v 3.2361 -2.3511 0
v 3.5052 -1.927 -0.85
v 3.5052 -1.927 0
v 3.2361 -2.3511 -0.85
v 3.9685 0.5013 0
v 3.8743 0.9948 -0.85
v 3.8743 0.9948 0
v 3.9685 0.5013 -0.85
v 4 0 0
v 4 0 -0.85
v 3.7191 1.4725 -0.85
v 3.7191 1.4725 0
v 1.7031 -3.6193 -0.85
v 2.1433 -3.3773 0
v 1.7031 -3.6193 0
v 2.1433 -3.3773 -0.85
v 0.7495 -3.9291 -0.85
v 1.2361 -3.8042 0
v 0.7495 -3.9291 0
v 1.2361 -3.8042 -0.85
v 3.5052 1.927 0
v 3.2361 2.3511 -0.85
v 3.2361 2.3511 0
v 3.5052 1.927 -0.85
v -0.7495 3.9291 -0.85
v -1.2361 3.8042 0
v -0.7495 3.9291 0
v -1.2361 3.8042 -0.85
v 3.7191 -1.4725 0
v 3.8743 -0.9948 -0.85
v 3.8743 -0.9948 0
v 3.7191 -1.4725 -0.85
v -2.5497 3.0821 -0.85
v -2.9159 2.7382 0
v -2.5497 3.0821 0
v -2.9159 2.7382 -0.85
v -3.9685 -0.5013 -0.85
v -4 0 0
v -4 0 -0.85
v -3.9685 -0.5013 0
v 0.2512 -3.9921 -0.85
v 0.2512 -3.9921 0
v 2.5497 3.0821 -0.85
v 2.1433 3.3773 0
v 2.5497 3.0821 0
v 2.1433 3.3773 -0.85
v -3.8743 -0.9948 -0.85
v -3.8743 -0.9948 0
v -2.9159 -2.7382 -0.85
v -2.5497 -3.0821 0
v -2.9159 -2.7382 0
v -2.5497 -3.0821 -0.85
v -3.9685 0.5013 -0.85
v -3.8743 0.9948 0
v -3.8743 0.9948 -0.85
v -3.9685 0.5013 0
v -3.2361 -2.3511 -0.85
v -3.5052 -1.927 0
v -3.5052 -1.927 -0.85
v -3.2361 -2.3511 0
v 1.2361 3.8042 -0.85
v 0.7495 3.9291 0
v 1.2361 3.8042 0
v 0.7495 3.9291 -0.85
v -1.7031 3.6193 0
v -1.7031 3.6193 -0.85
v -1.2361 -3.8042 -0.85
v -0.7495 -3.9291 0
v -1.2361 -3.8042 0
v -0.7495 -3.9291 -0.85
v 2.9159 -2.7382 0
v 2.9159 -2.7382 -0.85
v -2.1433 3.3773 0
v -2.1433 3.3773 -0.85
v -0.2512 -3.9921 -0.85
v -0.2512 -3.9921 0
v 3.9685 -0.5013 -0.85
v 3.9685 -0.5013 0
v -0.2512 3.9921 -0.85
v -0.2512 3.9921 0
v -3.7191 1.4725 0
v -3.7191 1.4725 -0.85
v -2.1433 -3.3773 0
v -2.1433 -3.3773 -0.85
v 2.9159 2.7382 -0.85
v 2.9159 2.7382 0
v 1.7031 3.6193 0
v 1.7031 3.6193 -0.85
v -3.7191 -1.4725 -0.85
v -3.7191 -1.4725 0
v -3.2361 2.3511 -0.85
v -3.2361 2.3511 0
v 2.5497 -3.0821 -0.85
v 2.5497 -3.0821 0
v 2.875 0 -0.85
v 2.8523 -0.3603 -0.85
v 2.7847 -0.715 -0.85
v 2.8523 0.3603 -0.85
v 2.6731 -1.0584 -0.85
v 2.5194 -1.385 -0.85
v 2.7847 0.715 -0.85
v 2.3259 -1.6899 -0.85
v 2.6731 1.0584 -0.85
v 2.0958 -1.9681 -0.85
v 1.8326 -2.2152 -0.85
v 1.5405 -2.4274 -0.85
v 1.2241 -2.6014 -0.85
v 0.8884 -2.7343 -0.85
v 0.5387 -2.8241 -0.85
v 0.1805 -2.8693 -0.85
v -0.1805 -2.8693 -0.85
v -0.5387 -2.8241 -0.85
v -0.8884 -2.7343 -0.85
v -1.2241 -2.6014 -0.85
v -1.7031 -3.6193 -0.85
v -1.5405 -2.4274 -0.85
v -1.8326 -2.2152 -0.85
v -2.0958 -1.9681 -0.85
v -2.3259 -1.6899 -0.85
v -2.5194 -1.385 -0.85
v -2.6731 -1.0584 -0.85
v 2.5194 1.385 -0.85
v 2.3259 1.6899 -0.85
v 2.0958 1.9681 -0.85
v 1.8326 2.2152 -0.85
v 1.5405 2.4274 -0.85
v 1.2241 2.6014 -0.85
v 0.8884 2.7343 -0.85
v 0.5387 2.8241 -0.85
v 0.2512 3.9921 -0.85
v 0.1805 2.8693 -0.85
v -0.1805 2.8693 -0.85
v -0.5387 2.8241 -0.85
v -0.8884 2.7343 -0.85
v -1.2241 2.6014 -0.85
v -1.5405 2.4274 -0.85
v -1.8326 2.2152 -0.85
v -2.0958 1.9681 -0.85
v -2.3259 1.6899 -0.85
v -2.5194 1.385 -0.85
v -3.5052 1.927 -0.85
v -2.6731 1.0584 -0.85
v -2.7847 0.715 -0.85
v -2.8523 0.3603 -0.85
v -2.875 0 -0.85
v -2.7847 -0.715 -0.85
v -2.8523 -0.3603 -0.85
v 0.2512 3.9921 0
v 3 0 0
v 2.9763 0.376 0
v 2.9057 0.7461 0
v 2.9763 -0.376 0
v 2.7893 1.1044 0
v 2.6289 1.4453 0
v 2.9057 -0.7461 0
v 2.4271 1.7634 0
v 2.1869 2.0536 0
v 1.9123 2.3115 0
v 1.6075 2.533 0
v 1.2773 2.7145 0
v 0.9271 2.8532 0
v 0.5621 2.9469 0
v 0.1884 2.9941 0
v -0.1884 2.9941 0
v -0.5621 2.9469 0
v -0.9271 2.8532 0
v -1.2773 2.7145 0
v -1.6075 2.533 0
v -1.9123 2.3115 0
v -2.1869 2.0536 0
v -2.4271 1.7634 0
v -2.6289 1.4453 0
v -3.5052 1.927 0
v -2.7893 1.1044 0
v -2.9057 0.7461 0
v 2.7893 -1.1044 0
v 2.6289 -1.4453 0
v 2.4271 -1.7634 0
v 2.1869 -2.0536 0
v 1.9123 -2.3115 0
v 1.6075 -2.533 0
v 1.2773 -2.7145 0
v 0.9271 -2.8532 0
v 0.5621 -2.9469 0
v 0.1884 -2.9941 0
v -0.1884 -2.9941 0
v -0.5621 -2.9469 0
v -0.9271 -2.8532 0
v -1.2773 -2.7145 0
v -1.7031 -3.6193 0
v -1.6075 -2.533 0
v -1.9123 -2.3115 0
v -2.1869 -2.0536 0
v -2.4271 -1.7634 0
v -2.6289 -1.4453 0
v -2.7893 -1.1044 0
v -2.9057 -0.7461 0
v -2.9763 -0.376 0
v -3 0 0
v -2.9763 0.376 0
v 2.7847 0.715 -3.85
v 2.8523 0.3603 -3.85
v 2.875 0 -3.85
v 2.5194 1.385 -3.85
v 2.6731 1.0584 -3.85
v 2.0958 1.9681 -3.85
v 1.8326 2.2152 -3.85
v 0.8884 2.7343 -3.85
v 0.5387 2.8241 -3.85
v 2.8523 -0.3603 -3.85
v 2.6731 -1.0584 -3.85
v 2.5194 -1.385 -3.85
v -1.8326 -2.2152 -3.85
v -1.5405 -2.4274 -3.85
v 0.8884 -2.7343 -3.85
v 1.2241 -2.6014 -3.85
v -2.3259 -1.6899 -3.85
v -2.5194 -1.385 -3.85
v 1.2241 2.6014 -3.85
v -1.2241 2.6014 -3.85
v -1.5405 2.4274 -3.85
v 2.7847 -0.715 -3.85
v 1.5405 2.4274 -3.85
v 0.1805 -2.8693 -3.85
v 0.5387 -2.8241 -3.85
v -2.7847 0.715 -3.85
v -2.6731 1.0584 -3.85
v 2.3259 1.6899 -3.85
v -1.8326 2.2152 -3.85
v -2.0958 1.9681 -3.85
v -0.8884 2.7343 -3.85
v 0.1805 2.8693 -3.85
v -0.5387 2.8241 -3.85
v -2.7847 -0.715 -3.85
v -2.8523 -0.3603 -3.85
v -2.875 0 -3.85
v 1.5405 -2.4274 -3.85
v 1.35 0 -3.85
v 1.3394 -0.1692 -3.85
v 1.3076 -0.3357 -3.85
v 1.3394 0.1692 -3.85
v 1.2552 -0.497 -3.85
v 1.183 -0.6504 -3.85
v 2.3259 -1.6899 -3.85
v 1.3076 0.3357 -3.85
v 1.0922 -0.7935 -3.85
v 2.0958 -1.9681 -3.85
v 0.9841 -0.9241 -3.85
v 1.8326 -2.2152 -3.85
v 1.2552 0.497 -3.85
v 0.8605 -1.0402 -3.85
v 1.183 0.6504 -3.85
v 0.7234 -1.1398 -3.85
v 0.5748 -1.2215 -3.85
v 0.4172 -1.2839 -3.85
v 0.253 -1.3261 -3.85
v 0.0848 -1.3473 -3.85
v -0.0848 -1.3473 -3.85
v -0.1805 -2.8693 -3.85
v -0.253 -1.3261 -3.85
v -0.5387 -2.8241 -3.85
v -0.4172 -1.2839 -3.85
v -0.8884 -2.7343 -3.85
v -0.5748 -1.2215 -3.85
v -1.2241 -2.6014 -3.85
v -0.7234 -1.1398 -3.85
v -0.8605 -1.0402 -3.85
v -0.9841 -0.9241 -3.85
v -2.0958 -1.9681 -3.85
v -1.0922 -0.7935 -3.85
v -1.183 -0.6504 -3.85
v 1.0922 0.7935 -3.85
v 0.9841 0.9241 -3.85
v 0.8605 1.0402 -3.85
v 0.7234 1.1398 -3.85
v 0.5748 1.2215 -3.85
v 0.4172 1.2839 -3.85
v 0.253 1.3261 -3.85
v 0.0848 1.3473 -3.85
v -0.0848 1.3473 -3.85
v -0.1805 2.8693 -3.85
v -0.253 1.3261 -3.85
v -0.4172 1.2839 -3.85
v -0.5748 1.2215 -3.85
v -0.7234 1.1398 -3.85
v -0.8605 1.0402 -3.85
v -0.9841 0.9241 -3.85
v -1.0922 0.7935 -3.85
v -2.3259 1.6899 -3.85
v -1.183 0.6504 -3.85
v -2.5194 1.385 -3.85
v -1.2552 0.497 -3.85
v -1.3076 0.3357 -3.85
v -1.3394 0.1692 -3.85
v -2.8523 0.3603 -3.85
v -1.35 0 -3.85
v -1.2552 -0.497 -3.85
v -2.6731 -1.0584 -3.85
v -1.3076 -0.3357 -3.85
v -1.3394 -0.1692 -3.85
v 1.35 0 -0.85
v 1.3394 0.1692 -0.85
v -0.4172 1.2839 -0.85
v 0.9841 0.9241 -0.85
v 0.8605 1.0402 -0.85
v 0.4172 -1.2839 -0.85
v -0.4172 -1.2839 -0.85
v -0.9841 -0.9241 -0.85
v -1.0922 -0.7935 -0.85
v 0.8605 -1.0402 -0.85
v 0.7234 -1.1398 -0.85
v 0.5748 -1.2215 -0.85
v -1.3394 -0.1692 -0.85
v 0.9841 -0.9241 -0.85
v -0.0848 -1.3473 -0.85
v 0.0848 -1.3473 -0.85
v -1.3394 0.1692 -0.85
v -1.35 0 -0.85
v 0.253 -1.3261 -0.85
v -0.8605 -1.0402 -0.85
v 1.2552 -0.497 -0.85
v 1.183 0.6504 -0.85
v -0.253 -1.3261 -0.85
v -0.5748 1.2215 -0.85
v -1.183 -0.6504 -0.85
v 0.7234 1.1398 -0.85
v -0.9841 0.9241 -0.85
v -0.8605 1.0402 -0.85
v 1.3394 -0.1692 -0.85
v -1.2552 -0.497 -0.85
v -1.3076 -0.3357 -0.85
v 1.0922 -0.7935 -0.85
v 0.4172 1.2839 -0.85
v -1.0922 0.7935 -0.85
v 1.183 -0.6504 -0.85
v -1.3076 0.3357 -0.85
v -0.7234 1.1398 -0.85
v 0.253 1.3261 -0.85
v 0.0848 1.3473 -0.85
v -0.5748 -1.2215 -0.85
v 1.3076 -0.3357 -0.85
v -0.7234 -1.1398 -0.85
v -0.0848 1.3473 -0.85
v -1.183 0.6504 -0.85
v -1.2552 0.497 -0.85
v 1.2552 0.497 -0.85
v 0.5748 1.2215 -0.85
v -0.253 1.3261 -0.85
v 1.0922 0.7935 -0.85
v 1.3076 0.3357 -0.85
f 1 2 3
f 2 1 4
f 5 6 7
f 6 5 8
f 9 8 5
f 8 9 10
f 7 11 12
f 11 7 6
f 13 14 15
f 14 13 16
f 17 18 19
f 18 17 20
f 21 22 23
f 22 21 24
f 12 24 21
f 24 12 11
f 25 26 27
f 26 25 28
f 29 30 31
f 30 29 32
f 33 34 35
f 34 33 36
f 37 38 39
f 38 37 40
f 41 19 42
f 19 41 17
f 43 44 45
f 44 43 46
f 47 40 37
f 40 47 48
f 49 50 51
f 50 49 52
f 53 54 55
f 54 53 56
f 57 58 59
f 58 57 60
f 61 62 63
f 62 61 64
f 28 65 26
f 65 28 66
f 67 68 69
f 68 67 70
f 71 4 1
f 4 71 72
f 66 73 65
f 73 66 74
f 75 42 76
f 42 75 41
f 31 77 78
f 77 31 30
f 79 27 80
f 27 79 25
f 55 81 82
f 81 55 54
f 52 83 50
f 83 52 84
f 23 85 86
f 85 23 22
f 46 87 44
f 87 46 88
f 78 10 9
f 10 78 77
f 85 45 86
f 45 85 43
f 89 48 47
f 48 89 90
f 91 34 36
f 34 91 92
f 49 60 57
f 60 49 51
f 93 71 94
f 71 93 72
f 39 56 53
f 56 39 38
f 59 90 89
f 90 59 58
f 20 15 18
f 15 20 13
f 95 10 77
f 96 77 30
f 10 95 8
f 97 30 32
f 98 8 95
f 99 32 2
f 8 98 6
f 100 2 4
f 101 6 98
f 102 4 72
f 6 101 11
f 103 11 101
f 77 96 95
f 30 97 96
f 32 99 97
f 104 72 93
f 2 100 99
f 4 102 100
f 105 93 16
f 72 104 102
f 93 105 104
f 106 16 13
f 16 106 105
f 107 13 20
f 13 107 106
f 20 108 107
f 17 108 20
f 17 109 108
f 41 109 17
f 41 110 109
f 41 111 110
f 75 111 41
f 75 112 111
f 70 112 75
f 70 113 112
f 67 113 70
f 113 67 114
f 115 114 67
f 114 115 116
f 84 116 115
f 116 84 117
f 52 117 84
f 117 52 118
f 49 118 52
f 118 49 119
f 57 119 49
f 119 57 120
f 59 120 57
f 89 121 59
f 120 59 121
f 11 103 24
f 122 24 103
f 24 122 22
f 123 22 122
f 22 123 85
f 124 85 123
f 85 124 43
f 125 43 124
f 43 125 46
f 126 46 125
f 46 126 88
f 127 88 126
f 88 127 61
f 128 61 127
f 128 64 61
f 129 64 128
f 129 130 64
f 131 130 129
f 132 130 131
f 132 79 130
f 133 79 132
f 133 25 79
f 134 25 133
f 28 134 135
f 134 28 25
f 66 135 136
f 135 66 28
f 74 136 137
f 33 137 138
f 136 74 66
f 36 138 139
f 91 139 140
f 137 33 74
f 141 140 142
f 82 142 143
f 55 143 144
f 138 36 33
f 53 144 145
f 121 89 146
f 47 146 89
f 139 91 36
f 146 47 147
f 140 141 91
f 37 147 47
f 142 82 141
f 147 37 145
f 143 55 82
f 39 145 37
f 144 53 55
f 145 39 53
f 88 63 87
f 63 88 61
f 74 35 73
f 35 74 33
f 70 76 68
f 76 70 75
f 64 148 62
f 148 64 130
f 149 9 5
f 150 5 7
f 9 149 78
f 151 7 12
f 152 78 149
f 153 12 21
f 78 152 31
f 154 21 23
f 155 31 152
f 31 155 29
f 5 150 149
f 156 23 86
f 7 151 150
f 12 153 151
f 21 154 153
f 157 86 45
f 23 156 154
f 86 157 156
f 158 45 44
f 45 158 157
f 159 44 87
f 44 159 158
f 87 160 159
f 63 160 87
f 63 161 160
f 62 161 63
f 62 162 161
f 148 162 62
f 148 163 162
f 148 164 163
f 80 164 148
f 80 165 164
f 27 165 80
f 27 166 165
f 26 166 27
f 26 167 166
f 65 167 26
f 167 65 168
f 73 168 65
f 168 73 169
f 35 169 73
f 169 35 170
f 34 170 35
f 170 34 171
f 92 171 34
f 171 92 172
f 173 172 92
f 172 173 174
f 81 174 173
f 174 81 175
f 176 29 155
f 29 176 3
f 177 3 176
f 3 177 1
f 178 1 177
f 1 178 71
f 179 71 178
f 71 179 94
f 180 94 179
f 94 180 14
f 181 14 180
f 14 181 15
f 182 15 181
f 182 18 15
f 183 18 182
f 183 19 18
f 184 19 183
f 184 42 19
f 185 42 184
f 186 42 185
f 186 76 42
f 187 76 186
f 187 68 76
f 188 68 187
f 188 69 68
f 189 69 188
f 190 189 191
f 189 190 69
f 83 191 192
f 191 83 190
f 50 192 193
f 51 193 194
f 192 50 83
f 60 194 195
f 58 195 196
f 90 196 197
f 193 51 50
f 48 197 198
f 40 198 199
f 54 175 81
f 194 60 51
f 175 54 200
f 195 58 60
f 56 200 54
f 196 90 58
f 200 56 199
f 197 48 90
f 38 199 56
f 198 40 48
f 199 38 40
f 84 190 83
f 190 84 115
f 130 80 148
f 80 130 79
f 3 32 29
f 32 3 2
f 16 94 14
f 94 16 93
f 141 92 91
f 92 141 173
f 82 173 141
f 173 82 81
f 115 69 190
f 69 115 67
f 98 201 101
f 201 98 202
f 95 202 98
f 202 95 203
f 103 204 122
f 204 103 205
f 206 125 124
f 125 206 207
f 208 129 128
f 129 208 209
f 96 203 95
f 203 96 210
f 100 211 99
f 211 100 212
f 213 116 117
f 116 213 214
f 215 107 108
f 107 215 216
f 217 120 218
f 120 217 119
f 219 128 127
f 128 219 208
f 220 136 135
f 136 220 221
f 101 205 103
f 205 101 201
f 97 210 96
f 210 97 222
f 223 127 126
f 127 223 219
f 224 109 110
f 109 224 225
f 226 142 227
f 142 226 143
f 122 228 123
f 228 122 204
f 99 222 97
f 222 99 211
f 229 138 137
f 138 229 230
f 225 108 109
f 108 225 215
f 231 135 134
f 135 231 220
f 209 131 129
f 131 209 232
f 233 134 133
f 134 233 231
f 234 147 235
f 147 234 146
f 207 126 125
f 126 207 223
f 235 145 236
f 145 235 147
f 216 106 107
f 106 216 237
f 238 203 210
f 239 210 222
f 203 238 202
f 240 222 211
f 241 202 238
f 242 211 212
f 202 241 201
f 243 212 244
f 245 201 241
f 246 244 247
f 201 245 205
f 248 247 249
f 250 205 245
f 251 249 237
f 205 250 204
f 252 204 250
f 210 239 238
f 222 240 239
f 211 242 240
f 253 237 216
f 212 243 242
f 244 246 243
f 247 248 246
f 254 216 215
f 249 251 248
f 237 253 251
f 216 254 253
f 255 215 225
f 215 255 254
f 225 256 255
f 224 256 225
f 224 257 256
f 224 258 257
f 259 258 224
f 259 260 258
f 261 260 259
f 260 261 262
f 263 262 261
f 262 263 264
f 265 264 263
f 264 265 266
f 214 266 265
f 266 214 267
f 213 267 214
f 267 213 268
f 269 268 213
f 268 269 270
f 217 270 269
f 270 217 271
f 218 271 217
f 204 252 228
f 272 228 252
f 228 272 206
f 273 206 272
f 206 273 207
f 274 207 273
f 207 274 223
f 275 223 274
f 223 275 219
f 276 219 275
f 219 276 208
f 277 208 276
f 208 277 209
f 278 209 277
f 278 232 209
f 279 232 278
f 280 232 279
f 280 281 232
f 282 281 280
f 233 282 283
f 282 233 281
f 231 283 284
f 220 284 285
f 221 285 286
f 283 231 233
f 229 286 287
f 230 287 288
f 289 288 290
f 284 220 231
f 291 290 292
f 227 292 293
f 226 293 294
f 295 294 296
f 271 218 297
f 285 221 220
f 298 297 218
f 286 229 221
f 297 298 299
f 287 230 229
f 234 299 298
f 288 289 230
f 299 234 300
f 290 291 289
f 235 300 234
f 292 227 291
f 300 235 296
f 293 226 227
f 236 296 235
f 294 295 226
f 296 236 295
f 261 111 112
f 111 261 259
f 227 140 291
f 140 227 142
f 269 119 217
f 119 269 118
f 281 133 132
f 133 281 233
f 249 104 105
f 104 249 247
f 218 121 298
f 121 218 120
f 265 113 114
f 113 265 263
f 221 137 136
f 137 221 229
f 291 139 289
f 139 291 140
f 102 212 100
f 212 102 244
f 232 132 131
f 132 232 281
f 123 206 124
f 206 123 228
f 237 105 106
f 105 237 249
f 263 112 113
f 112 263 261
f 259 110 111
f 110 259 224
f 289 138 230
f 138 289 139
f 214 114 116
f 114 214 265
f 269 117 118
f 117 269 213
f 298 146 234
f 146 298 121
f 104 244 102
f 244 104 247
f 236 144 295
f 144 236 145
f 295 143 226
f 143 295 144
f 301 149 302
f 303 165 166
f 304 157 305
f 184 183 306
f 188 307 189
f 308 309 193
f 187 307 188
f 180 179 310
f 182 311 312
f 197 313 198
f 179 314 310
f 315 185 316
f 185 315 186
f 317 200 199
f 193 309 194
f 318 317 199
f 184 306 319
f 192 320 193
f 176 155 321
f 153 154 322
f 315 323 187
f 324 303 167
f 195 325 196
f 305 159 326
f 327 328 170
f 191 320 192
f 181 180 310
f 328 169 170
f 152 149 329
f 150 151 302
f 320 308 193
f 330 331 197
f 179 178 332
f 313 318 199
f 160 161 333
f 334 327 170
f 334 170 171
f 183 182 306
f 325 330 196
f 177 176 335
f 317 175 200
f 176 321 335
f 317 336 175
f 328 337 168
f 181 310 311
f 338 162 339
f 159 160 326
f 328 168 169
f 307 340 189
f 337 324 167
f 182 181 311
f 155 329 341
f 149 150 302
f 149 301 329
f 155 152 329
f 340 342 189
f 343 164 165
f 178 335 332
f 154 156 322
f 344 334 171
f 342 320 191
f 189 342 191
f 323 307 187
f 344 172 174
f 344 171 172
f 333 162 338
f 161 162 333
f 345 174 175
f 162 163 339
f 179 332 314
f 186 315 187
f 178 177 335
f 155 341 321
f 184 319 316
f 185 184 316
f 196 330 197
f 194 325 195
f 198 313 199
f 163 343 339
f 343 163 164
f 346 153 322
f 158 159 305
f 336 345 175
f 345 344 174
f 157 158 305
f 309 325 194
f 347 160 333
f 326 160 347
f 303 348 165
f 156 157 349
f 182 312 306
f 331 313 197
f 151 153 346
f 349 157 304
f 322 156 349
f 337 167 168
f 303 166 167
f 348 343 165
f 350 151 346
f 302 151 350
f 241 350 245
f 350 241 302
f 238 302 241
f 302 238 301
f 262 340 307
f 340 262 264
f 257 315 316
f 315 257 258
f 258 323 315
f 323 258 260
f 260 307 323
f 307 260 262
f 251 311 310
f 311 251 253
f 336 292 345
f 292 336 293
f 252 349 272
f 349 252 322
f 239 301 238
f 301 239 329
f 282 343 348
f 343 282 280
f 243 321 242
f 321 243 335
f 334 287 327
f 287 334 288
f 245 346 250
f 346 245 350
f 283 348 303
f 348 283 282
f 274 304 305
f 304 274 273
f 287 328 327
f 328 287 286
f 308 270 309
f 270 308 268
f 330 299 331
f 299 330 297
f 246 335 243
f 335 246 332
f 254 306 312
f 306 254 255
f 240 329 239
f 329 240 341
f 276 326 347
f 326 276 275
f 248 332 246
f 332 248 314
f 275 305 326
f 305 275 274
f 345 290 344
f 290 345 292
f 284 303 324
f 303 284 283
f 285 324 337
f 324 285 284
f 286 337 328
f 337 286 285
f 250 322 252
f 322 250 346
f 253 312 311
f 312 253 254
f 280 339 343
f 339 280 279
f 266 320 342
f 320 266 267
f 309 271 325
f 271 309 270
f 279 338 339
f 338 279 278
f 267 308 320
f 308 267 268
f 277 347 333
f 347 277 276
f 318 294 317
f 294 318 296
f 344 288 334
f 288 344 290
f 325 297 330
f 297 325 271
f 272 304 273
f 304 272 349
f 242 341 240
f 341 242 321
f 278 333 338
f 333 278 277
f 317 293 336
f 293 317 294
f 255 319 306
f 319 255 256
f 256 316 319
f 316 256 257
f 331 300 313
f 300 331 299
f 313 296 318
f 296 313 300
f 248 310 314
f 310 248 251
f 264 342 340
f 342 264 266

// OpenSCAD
$fn = 50;

difference() {
	union() {
		translate(v = [0, 0, -0.85]) {
			cylinder(h = 0.85, r = 4.0);
		}
		#translate(v = [0, 0, -3.85]) {
			cylinder(h = 3.85, r = 2.875);
		}
	}
	union() {
		translate(v = [0, 0, 0]) {
			rotate(a = [0, 0, 0]) {
				difference() {
					union() {
						translate(v = [0, 0, -3.85]) {
							cylinder(h = 3.85, r = 1.0);
						}
						translate(v = [0, 0, -0.85]) {
							cylinder(h = 0.85, r1 = 1.35, r2 = 3.0);
						}
						translate(v = [0, 0, -3.85]) {
							cylinder(h = 3.85, r = 1.35);
						}
						translate(v = [0, 0, -3.85]) {
							cylinder(h = 3.85, r = 1.0);
						}
					}
					union();
				}
			}
		}
	}
}
